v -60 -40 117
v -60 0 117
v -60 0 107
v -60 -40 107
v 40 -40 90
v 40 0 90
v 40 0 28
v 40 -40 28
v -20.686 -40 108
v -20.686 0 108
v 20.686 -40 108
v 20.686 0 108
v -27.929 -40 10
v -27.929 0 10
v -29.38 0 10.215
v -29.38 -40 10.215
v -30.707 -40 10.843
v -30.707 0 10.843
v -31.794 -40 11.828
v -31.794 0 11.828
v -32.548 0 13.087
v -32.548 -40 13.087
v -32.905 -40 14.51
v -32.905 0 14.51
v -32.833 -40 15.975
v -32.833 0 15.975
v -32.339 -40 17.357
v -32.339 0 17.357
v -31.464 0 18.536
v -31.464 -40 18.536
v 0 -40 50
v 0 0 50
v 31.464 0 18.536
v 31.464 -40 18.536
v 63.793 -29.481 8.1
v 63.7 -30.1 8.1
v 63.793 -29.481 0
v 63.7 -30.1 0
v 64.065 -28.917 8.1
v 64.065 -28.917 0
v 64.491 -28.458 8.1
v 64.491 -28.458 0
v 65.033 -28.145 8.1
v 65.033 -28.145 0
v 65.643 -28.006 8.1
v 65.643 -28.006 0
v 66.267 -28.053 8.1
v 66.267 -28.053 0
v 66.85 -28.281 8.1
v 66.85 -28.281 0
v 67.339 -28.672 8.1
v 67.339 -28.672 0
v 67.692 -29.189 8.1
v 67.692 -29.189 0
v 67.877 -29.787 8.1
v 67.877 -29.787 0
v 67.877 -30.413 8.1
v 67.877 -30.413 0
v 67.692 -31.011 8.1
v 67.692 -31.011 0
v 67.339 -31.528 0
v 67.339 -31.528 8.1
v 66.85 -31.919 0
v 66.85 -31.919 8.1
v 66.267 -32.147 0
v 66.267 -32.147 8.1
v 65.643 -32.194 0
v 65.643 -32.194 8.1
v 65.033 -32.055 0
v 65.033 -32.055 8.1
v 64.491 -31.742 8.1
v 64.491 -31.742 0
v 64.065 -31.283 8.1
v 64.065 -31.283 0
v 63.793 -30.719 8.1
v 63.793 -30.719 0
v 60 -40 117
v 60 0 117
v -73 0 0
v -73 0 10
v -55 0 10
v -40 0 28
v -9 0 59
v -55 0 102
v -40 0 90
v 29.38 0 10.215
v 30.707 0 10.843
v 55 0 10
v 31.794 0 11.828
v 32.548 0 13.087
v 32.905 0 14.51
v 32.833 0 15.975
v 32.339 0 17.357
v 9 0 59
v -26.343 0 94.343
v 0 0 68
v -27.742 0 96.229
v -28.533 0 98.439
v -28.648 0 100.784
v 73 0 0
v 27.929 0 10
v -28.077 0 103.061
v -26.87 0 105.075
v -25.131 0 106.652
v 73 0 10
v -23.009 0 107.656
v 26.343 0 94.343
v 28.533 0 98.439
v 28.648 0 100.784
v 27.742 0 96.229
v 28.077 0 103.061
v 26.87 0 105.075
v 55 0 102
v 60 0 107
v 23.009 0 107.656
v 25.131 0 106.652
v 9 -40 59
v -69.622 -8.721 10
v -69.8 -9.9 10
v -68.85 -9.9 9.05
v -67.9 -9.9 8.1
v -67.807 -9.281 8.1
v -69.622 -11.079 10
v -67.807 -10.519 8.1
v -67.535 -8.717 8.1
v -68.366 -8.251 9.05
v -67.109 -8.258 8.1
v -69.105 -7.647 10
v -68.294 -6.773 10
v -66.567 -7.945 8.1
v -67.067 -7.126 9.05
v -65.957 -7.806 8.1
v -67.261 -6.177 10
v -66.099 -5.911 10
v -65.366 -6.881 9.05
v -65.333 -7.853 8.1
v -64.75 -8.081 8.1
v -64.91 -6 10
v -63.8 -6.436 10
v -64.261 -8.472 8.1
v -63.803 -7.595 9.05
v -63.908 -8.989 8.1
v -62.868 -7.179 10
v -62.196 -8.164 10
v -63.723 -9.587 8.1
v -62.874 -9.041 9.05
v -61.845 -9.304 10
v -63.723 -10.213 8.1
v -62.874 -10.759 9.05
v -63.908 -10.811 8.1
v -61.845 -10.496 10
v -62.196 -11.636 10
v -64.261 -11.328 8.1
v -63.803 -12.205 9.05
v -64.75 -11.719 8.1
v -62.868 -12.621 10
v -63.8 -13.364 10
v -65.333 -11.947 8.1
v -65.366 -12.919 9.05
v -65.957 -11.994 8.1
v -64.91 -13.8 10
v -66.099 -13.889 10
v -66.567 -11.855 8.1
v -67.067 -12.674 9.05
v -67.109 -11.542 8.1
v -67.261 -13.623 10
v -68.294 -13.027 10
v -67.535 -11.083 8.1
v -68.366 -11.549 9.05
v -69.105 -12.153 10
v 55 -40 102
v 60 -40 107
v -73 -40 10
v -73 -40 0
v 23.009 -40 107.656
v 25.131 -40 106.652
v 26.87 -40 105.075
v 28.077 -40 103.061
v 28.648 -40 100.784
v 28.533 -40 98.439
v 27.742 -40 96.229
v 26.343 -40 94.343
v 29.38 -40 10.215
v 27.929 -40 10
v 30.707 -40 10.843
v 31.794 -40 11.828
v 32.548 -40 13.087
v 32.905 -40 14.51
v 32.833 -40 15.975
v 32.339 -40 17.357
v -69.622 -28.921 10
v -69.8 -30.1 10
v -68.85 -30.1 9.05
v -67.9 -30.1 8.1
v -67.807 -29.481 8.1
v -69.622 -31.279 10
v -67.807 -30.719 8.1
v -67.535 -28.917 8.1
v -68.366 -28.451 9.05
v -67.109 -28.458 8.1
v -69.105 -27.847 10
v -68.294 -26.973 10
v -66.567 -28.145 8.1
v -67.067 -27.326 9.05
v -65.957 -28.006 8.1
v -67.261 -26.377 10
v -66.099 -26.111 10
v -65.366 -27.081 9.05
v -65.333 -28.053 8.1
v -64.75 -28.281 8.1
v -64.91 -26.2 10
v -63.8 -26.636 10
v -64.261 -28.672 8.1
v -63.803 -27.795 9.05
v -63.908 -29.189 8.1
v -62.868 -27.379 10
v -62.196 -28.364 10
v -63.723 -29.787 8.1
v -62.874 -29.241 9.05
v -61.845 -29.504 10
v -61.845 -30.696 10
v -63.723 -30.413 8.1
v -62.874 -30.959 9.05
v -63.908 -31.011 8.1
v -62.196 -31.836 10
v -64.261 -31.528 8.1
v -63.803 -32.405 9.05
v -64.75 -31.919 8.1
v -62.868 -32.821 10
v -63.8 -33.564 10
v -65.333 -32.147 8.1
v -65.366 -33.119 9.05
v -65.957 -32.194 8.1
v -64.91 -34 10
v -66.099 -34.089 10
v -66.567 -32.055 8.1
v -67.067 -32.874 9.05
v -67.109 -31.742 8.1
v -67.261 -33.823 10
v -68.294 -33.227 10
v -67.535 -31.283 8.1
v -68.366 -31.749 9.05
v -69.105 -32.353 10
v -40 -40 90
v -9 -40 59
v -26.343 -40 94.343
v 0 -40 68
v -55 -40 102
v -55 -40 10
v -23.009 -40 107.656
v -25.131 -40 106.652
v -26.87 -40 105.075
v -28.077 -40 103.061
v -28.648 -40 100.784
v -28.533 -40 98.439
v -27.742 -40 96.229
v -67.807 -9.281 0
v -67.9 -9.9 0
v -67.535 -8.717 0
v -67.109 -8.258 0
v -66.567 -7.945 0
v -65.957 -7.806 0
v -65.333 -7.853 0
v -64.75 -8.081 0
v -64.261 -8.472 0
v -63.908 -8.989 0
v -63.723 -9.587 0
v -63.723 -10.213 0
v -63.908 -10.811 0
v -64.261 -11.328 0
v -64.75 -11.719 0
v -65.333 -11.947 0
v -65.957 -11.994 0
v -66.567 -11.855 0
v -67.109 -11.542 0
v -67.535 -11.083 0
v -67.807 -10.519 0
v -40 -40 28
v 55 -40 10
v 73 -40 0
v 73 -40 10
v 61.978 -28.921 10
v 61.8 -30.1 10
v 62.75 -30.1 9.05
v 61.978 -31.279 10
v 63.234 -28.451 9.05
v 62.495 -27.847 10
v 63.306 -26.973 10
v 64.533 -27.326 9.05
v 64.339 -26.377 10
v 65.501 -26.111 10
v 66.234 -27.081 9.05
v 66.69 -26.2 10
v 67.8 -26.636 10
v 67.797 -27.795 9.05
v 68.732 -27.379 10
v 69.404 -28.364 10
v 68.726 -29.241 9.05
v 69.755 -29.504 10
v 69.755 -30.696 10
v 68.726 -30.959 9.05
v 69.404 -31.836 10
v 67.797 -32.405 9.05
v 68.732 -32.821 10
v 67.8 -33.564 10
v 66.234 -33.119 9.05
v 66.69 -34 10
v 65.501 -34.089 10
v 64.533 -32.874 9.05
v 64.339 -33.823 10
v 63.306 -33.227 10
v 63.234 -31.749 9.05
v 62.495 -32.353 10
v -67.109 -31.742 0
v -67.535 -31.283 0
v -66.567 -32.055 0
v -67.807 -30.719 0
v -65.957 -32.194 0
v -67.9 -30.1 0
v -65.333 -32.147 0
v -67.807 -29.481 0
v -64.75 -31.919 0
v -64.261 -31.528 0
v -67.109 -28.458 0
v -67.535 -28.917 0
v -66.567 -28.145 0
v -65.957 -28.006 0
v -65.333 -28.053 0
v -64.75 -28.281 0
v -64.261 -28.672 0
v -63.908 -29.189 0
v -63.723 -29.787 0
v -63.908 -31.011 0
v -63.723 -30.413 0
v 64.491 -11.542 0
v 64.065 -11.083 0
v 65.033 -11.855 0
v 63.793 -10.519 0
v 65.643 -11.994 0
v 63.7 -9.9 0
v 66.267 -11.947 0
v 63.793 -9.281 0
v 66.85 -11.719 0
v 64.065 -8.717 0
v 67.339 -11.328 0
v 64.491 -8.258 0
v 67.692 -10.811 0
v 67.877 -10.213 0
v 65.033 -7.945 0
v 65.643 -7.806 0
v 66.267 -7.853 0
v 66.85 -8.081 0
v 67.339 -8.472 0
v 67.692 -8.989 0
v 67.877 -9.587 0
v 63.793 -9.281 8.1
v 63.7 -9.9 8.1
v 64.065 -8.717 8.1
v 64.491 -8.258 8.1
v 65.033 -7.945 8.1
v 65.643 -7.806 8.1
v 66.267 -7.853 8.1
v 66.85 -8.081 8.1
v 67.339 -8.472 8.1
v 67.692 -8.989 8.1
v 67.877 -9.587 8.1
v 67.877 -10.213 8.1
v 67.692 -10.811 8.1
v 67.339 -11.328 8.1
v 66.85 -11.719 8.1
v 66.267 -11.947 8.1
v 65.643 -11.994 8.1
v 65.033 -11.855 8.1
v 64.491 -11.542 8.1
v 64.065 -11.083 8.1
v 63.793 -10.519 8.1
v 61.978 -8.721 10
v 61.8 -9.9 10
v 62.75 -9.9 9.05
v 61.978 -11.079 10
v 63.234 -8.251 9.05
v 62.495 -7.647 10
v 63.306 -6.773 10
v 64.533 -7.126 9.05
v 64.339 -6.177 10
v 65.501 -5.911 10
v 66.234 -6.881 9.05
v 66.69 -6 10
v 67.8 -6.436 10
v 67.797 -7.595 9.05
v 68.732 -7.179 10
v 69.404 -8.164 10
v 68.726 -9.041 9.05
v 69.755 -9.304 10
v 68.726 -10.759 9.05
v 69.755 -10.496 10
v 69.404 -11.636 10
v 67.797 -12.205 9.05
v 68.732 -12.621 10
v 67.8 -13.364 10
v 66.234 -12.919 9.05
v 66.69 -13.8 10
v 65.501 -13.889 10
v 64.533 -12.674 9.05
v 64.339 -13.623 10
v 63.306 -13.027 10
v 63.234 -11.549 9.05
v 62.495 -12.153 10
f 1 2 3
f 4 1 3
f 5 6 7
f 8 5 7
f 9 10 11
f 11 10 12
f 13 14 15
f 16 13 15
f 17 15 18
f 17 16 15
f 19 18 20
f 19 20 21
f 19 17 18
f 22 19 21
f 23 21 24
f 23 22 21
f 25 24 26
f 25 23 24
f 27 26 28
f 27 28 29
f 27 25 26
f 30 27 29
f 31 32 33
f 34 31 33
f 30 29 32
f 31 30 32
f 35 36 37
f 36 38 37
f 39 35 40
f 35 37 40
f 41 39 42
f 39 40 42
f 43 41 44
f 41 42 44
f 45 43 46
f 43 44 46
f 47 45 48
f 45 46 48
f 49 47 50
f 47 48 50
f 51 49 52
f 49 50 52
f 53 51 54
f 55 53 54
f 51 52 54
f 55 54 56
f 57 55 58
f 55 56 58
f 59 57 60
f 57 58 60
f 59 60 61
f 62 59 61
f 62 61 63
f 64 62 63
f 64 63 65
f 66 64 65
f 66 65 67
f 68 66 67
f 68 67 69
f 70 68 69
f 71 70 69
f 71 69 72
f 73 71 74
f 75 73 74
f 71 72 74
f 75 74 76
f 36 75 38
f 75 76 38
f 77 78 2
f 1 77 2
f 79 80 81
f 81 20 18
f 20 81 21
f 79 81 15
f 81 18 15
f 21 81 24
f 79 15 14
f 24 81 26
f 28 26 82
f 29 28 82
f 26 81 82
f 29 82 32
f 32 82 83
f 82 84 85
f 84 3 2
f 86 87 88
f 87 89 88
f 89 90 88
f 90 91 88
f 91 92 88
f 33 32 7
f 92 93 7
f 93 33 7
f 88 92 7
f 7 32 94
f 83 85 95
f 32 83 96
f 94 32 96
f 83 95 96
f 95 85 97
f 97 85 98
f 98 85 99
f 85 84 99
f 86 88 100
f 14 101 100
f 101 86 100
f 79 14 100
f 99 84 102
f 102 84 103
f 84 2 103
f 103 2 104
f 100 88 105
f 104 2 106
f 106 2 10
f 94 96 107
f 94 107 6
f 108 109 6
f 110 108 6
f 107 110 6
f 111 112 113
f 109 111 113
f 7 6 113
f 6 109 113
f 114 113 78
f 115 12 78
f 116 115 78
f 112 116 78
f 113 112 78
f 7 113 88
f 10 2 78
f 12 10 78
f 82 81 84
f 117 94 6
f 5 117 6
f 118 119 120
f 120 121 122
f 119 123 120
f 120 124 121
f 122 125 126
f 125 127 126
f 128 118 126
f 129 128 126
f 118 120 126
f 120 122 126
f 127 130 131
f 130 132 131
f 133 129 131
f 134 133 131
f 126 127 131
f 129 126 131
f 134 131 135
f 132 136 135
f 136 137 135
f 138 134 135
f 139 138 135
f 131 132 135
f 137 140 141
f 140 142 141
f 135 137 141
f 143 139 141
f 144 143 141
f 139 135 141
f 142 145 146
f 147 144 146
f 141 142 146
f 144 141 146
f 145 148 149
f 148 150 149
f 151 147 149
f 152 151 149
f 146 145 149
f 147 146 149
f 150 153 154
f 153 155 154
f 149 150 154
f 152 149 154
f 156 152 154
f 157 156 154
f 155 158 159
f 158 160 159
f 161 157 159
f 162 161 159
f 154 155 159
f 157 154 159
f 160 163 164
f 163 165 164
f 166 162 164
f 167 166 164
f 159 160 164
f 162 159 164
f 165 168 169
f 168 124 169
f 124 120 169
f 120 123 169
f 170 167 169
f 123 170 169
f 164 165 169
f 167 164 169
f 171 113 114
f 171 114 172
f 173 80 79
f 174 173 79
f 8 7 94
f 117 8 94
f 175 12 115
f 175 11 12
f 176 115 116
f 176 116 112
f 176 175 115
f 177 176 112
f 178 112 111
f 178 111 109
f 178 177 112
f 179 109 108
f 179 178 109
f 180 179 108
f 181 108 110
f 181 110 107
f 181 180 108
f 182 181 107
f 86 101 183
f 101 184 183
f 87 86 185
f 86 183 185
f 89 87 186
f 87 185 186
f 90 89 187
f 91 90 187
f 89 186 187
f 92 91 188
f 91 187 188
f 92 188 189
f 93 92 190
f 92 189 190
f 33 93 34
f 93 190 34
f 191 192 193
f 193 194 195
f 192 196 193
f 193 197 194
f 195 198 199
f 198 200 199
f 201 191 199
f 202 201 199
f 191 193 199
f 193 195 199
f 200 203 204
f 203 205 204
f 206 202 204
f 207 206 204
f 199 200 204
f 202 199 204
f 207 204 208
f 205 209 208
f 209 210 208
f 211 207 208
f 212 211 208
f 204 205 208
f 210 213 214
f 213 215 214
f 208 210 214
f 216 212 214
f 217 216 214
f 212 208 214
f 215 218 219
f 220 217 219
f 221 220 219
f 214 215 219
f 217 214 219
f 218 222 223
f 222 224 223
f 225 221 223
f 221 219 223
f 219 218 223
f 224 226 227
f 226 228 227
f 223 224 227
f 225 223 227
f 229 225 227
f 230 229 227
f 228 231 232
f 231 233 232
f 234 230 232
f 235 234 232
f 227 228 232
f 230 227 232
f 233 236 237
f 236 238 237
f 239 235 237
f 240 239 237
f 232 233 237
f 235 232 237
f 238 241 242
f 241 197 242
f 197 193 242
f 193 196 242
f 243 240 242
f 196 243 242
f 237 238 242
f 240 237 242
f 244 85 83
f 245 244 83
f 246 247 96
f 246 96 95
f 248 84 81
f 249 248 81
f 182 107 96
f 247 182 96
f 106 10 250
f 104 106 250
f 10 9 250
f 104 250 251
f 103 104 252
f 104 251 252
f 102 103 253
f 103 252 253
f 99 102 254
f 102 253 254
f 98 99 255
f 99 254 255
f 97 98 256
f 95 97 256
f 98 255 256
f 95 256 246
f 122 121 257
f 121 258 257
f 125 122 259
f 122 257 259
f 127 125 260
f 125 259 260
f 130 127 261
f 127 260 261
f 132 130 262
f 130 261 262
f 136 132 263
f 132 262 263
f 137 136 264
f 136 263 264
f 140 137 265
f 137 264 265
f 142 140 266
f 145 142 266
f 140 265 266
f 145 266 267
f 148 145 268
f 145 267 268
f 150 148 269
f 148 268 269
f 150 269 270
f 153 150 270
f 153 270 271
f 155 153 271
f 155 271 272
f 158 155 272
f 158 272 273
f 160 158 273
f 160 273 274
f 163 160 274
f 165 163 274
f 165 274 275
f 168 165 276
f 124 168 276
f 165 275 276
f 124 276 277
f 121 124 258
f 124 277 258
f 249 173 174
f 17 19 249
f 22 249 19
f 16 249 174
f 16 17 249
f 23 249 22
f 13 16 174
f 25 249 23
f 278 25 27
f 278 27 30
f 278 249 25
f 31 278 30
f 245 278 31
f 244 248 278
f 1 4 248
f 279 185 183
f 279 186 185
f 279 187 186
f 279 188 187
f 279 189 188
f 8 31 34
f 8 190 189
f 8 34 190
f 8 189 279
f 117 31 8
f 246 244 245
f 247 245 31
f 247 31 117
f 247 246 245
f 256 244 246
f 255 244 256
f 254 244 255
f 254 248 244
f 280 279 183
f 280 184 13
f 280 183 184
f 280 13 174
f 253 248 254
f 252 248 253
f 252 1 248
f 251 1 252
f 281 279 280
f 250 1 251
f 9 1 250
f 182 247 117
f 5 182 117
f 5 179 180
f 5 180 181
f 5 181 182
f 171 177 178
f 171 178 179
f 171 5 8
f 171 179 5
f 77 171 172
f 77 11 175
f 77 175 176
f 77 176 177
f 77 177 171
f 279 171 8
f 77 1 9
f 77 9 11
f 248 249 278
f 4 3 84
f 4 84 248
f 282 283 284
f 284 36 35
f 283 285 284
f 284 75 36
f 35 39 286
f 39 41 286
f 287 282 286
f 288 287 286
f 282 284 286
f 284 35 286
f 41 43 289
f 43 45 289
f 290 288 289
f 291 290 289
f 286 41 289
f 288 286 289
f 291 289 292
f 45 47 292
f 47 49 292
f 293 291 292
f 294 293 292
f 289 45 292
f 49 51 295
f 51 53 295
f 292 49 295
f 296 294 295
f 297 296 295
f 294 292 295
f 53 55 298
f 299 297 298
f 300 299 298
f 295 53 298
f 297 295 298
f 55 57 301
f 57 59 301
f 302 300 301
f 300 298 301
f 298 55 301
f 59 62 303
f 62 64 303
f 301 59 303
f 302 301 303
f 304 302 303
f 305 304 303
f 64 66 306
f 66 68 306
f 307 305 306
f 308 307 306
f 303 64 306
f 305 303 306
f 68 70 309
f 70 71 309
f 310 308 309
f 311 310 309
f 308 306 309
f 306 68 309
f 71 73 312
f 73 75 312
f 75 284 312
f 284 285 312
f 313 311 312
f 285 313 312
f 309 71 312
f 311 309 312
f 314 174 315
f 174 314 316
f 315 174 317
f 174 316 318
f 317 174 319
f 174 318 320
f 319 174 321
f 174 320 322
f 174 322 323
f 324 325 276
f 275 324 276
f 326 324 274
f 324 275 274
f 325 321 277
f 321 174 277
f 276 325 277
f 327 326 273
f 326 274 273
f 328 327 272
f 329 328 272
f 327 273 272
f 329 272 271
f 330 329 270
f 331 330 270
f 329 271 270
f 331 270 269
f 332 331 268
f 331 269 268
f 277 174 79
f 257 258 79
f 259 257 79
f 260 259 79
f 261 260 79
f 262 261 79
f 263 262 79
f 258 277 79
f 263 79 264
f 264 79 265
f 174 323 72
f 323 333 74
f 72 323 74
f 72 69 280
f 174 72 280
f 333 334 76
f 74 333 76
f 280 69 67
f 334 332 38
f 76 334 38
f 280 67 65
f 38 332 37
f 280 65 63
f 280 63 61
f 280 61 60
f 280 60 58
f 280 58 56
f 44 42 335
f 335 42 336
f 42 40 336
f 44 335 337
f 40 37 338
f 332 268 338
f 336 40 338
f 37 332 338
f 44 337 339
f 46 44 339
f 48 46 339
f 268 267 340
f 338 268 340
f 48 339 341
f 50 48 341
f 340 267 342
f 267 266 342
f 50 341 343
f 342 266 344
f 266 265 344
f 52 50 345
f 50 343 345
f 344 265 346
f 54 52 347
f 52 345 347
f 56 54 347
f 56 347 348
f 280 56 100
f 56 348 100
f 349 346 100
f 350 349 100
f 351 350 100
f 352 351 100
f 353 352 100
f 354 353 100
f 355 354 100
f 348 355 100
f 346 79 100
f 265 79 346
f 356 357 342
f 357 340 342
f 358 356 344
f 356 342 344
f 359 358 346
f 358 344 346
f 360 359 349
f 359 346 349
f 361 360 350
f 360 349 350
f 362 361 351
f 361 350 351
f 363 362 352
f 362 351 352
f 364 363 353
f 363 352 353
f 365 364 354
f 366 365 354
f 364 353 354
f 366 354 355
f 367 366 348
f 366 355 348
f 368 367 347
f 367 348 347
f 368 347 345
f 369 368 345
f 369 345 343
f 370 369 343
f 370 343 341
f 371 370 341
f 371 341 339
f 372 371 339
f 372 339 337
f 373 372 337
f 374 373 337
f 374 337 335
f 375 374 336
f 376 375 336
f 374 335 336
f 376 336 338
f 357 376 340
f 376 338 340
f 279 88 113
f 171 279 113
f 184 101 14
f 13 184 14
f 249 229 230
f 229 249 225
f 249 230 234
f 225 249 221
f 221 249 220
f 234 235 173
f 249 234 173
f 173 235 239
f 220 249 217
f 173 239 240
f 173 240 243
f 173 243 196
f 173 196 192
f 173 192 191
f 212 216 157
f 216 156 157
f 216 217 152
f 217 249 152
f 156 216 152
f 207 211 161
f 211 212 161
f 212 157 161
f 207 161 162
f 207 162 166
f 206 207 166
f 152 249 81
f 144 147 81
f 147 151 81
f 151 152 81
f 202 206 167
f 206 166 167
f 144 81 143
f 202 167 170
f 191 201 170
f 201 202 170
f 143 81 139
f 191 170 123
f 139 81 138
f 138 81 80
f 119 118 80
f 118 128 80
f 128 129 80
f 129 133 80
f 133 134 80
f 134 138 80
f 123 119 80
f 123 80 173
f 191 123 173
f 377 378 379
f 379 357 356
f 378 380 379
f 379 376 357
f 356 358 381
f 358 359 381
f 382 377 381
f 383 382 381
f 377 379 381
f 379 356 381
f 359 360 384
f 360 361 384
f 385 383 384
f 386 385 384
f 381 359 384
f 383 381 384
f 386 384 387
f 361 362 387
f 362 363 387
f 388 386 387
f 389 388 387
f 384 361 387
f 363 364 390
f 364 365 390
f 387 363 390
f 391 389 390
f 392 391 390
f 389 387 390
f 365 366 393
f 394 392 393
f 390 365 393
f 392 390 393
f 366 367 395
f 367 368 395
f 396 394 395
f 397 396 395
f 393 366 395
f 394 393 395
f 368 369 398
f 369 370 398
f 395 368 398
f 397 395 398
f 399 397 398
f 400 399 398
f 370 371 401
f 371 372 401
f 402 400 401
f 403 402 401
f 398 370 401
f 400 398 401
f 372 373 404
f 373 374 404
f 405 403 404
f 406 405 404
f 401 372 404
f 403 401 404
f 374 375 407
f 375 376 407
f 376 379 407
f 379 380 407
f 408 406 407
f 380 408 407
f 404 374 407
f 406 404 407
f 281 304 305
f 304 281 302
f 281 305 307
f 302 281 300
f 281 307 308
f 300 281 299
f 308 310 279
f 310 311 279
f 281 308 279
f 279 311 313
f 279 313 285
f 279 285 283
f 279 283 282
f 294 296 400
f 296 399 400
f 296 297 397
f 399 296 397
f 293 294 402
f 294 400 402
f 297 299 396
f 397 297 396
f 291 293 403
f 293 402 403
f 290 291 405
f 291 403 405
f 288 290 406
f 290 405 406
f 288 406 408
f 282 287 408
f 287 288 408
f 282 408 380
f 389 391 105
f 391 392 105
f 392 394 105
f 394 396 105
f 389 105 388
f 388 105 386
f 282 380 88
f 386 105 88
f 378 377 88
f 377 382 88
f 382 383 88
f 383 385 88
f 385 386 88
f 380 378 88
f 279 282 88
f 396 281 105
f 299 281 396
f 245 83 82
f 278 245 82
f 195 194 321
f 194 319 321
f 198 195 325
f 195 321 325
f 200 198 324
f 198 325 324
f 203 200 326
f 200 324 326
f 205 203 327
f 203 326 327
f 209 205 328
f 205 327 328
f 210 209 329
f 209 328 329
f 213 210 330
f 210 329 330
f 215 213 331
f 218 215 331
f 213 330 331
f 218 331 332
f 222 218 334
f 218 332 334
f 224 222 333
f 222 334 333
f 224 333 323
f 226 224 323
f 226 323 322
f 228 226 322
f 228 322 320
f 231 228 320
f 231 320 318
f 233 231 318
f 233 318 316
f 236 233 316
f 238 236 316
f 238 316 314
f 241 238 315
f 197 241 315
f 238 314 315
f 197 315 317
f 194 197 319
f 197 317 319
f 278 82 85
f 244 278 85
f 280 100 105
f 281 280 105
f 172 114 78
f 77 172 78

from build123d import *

# Parameters (mm, degrees)
F1_DEPTH       = 40
F2_R           = 8
F3_R           = 5
F5_D           = 4.2
F5_CSINK_D     = 8
F5_CSINK_ANGLE = 90
F6_SIZE        = 4.99999


# Not quite as in the source:
# - a fillet or chamfer is up to 0.001 mm smaller than in the source, because OpenCascade refuses the exact size


with BuildPart() as f1:
    # F0 (on Front) → F1 (new body)
    with BuildSketch(Plane.XZ):
        Polygon((-73, 10), (-73, 0), (0, 0), (73, 0), (73, 10), (55, 10), (55, 107), (60, 107), (60, 117), (0, 117), (-60, 117), (-60, 107), (-55, 107), (-55, 10), align=None)
        Polygon((0, 10), (-40, 10), (0, 50), (40, 10), align=None, mode=Mode.SUBTRACT)
        Polygon((-9, 59), (-40, 28), (-40, 90), align=None, mode=Mode.SUBTRACT)
        Polygon((40, 90), (40, 28), (9, 59), align=None, mode=Mode.SUBTRACT)
        Polygon((40, 108), (0, 68), (-40, 108), (0, 108), align=None, mode=Mode.SUBTRACT)
    extrude(amount=F1_DEPTH)

    # F2
    f2_edges = [f1.edges().sort_by_distance(p)[0] for p in [
        (-40, -20, 108),
        (40, -20, 108),
    ]]
    fillet(f2_edges, radius=F2_R)

    # F3
    f3_edges = [f1.edges().sort_by_distance(p)[0] for p in [
        (-40, -20, 10),
        (40, -20, 10),
    ]]
    fillet(f3_edges, radius=F3_R)

    # F5 (through all)
    with Locations(Plane.XY.offset(10)):
        with Locations((-65.8, -9.9), (-65.8, -30.1), (65.8, -30.1), (65.8, -9.9)):
            CounterSinkHole(F5_D / 2, F5_CSINK_D / 2, counter_sink_angle=F5_CSINK_ANGLE)

    # F6 (size 5 in the source; OpenCascade refuses exactly that, so slightly less here)
    f6_edges = [f1.edges().sort_by_distance(p)[0] for p in [
        (-55, -20, 107),
        (55, -20, 107),
    ]]
    chamfer(f6_edges, length=F6_SIZE)


solid = f1.part
